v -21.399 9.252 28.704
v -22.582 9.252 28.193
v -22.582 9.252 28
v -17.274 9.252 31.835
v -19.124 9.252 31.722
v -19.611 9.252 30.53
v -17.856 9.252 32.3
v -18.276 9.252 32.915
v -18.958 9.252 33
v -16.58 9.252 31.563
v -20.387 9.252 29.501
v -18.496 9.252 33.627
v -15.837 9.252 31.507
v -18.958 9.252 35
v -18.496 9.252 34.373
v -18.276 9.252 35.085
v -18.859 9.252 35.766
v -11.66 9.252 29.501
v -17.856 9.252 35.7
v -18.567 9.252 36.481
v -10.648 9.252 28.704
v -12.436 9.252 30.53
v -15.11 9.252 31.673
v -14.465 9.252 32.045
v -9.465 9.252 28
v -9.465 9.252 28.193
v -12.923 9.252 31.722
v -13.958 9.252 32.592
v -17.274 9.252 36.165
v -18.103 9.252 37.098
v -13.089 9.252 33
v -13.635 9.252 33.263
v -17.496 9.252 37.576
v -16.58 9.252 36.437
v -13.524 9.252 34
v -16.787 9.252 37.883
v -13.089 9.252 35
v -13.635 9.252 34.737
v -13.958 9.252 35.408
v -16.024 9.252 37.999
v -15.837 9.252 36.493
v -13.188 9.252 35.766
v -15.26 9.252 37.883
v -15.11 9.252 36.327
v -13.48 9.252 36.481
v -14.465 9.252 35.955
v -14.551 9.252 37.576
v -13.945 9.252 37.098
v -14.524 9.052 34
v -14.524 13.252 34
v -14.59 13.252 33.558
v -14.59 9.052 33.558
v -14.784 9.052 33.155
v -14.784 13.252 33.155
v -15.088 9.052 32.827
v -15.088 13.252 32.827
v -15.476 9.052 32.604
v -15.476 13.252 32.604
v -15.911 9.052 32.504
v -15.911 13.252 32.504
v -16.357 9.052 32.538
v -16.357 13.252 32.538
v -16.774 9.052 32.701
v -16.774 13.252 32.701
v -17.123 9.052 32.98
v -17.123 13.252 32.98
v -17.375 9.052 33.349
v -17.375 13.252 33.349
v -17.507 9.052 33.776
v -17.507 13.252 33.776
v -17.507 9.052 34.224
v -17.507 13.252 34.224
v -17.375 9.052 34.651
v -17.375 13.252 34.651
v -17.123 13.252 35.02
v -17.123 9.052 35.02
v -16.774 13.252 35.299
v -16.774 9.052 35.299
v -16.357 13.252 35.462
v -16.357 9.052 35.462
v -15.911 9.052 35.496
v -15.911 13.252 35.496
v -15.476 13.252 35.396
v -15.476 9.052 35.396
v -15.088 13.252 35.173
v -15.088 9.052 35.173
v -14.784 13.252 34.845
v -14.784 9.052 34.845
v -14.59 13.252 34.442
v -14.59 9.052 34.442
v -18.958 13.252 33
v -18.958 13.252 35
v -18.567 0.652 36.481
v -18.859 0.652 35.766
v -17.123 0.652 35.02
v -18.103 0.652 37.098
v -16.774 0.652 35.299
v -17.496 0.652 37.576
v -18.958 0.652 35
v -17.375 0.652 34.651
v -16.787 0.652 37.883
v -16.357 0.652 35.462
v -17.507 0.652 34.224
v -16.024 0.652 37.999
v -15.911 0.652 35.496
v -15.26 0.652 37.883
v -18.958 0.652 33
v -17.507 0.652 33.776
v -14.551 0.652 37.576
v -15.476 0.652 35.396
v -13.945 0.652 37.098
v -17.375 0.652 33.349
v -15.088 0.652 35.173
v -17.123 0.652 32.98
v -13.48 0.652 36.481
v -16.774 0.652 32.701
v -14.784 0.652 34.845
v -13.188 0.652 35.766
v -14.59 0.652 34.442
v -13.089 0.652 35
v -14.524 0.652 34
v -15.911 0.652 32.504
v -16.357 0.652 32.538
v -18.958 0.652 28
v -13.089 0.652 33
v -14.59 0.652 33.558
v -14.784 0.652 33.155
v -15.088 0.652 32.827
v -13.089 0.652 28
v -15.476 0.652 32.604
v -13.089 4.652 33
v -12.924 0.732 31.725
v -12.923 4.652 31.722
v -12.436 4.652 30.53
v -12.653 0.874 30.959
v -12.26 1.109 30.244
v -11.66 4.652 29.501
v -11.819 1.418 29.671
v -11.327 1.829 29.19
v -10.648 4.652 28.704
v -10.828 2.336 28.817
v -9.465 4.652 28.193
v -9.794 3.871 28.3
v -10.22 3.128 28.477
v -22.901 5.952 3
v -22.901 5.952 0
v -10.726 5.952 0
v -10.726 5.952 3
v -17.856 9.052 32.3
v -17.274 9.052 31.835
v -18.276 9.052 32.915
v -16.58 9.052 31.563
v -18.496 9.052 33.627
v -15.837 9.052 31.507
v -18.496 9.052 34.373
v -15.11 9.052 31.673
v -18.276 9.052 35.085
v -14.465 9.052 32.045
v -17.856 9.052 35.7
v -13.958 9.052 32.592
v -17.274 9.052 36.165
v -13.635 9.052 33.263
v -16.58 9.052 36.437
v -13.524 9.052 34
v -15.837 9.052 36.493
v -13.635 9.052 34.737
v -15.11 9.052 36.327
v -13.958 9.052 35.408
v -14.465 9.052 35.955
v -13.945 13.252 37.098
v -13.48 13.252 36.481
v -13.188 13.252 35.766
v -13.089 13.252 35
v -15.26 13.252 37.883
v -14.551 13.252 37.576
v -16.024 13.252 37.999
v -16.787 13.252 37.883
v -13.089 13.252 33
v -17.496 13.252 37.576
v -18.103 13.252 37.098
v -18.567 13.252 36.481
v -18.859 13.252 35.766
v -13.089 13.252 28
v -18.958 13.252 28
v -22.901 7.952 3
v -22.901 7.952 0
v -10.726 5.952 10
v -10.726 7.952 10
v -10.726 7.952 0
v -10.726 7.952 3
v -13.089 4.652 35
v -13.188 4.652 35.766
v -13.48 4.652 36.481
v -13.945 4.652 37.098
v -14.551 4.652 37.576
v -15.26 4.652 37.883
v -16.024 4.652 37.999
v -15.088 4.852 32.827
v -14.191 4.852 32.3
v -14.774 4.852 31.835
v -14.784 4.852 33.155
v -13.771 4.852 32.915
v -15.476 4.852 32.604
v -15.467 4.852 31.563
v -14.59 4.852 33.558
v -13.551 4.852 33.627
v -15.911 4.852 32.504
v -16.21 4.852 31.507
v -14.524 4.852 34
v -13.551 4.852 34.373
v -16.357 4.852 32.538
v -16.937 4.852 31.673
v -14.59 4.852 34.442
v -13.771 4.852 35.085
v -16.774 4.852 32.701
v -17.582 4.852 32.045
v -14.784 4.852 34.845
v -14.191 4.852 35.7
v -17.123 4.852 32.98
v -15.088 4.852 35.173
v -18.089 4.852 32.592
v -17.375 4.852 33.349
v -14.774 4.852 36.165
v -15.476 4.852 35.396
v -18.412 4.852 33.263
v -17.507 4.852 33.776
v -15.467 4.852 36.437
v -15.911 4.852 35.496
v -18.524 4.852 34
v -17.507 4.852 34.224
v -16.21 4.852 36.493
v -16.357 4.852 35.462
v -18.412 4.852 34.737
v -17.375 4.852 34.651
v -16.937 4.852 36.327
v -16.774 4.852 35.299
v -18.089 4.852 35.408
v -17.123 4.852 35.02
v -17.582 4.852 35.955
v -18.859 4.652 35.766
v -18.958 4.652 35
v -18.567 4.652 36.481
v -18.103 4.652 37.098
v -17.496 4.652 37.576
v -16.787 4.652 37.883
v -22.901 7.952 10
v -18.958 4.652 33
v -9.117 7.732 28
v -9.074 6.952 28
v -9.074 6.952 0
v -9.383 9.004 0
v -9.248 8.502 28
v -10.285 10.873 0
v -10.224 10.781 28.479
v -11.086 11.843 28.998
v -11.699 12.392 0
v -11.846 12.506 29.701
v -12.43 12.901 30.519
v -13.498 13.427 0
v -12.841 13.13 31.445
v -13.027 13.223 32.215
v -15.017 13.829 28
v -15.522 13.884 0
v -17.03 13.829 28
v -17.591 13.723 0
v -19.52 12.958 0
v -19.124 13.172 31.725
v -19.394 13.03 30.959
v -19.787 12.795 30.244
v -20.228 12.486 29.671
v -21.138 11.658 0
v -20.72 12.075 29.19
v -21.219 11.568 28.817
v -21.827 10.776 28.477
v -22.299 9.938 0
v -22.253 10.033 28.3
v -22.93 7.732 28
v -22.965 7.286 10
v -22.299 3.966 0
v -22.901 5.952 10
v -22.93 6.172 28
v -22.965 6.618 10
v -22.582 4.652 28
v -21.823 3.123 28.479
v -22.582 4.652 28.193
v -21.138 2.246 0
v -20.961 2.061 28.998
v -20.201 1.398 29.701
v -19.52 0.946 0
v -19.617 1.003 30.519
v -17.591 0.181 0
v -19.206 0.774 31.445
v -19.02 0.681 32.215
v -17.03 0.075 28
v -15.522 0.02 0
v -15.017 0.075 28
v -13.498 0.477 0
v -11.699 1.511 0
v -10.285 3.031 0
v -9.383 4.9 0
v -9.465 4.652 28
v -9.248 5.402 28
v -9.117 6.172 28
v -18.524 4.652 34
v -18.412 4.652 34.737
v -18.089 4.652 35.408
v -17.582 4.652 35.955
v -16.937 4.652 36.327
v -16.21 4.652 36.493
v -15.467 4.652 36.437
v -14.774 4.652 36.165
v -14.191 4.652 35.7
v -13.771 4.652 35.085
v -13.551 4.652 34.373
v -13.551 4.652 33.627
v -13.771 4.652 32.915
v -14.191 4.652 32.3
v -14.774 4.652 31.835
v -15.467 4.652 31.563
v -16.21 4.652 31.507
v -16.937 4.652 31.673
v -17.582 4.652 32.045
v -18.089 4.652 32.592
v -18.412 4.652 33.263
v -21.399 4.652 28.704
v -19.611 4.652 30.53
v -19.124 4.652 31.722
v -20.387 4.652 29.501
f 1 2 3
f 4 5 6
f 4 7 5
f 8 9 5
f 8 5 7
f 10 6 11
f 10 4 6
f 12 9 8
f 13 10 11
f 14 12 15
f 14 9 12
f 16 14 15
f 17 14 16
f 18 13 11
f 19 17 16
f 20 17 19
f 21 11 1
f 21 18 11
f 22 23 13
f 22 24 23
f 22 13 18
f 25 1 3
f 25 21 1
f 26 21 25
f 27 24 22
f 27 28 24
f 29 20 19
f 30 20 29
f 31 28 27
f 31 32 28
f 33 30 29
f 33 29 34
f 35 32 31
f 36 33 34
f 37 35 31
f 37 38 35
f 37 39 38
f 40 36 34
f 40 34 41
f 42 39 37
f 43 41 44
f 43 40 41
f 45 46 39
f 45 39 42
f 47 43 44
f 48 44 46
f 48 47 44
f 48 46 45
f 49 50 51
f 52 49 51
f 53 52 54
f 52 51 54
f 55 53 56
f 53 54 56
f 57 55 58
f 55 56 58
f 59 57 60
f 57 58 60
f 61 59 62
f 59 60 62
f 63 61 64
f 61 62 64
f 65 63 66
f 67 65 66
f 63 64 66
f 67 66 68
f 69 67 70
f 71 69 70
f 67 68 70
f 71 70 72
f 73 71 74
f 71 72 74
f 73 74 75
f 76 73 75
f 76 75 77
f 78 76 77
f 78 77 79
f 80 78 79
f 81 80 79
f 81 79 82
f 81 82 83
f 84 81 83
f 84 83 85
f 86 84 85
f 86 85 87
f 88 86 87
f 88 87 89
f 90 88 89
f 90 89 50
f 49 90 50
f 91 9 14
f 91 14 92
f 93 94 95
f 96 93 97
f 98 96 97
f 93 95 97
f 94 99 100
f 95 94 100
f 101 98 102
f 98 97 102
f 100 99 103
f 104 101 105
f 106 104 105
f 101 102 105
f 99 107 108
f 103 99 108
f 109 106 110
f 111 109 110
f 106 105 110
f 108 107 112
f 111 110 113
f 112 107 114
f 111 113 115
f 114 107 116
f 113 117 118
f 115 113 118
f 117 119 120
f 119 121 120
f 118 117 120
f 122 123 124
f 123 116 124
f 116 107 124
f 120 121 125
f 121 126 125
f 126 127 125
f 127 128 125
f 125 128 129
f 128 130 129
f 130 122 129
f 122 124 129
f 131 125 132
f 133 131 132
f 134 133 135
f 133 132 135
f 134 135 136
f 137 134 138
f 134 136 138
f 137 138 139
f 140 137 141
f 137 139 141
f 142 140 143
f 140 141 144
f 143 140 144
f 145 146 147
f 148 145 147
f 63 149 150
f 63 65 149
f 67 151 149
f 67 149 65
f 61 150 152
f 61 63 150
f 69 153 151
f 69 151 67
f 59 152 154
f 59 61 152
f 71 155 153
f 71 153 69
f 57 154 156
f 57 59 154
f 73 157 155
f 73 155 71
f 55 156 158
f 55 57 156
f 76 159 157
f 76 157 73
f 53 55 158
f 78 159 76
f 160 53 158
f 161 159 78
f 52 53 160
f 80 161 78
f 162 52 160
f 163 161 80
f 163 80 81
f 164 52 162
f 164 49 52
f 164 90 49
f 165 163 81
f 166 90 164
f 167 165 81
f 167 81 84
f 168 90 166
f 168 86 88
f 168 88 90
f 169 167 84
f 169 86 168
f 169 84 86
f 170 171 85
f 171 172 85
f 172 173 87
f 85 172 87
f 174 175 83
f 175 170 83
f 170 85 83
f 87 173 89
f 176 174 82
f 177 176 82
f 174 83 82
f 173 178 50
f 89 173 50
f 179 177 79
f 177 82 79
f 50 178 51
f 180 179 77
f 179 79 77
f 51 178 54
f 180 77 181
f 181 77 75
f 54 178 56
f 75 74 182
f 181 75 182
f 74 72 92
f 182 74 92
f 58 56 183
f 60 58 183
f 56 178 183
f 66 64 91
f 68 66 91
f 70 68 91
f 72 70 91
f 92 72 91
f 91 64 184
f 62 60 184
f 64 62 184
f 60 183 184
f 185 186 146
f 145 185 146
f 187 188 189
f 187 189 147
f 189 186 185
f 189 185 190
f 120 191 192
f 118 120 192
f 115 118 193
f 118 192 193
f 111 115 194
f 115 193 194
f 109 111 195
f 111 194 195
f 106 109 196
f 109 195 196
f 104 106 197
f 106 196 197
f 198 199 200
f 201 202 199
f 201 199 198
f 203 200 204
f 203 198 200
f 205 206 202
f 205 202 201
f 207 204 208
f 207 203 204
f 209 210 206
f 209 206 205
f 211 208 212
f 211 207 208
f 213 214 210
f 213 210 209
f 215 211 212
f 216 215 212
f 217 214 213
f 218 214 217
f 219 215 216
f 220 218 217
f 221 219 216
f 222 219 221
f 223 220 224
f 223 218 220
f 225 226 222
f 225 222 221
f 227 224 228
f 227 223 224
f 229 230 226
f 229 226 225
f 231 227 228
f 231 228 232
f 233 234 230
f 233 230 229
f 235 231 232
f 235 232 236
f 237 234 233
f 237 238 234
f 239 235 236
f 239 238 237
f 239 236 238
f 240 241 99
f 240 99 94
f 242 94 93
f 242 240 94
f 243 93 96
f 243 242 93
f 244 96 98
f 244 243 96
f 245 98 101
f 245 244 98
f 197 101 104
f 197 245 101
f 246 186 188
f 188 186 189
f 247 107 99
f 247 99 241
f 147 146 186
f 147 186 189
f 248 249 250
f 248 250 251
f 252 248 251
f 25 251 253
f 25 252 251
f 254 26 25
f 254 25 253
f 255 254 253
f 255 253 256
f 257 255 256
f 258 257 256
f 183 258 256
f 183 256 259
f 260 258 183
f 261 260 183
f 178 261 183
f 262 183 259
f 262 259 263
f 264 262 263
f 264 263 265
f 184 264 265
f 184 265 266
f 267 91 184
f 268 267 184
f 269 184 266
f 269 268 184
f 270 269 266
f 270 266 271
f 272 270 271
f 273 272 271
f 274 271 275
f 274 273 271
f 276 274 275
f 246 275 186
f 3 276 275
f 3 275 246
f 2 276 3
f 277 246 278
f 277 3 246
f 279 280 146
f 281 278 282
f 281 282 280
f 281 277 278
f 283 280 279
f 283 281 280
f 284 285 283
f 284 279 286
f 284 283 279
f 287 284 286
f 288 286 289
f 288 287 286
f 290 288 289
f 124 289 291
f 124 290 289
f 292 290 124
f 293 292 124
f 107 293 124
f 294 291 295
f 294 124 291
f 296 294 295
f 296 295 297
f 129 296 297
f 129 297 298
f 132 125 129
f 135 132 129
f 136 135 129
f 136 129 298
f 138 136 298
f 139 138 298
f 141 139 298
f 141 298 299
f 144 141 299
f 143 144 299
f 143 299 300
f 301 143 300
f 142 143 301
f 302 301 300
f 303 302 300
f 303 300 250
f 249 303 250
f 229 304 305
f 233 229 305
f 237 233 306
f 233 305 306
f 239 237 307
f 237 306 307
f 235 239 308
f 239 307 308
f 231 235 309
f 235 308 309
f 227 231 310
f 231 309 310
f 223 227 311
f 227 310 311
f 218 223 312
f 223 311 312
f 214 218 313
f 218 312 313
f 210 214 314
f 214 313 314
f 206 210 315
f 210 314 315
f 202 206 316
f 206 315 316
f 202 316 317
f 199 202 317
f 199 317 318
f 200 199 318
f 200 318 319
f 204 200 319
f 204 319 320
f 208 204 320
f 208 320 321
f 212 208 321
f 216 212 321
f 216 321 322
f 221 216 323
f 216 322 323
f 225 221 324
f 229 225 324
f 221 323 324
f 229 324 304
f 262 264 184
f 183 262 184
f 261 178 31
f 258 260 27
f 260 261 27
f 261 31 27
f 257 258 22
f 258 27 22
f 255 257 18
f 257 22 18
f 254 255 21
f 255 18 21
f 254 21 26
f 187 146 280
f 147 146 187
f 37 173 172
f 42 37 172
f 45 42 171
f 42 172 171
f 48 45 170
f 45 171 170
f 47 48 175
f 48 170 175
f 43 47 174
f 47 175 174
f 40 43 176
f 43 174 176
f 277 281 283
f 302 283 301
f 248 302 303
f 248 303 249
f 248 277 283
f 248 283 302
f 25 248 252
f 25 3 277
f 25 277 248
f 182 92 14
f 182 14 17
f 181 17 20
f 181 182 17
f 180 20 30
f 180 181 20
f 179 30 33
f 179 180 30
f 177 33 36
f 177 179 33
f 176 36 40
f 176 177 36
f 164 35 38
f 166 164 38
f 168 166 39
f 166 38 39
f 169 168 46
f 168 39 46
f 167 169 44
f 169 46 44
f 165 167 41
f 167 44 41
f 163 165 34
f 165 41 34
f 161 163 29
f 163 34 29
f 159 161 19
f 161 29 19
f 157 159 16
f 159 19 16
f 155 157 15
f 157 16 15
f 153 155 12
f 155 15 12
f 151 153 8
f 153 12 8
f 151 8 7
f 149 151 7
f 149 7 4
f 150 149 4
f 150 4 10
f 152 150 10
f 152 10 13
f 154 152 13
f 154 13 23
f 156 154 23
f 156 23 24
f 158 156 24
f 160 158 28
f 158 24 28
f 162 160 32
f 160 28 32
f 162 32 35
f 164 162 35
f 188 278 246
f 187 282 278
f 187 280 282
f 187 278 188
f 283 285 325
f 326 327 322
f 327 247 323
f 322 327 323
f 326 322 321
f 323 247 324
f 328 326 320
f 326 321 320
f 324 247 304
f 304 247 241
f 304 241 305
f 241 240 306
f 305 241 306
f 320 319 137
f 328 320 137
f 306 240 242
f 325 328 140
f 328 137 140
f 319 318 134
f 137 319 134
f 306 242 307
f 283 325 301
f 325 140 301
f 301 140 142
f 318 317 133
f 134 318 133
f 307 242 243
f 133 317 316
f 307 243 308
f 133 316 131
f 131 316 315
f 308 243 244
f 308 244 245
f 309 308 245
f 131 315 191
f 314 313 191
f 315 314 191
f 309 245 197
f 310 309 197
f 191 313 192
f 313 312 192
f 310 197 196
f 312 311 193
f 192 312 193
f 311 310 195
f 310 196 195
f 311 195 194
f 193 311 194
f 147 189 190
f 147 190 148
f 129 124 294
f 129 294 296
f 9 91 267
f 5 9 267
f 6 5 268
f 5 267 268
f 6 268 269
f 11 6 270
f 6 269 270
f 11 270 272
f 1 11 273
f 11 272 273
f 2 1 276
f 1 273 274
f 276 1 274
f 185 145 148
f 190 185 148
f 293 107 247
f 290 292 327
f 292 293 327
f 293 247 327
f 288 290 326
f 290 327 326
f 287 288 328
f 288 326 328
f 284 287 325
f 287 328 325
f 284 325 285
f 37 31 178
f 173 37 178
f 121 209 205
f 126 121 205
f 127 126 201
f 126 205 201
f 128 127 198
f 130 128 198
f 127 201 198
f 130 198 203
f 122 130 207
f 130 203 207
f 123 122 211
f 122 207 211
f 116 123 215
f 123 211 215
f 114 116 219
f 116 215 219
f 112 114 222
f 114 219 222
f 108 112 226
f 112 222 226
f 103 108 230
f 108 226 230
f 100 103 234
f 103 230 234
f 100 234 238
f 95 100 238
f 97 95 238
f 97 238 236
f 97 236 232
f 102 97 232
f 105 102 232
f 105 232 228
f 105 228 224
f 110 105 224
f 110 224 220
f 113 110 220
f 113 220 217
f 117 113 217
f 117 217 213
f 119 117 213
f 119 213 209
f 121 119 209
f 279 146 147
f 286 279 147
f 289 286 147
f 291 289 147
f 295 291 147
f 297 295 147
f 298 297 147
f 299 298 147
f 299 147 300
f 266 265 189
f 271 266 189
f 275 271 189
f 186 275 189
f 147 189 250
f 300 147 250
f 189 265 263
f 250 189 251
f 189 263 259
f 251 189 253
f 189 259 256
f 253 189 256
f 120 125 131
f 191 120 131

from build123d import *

# Parameters (mm, degrees)
F0_R         = 6.95
F1_DEPTH     = 28
F2_W         = 2.9347061182
F2_H         = 4
F3_DEPTH     = 10
F4_T1_DEPTH  = 19
F4_T3_DEPTH  = 19
F5_T4_DEPTH  = 4
F5_S5_R      = 6.95
F5_T6_DEPTH  = 6
F5_T10_DEPTH = 4
F5_S11_R     = 6.95
F5_T12_DEPTH = 6
F5_T16_DEPTH = 4
F5_S17_R     = 6.95
F5_T18_DEPTH = 6
F5_T22_DEPTH = 4
F5_S23_R     = 6.95
F5_T24_DEPTH = 6
F7_W         = 12.5890113413
F7_H         = 2
F8_DEPTH     = 10
F9_W         = 12.1756089176
F9_H         = 2
F10_DEPTH    = 3
F11_R        = 2.5
F12_DEPTH    = 0.2
F13_R        = 2.5
F14_DEPTH    = 0.2
F15_DEPTH    = 13.2510001


# Not quite as in the source:
# - a fillet or chamfer that OpenCascade refuses, or shapes differently, is made with other operations: its cross-section is extruded or revolved along the edge and cut away or added


with BuildPart() as f1:
    # F0 (on Top) → F1 (new body)
    with BuildSketch(Plane.XY):
        with Locations((-16.023524542, 6.9519880981)):
            Circle(F0_R)
    extrude(amount=F1_DEPTH)

    # F2 (on face) → F3 (join)
    with BuildSketch(Plane.XY.offset(28)):
        with Locations((-17.490877601, 11.2519880981)):
            Rectangle(F2_W, F2_H)
        with Locations((-14.5561714829, 11.2519880981)):
            Rectangle(F2_W, F2_H)
        with Locations((-17.490877601, 2.6519880981)):
            Rectangle(F2_W, F2_H)
        with Locations((-14.5561714829, 2.6519880981)):
            Rectangle(F2_W, F2_H)
    extrude(amount=F3_DEPTH)

    # F4: fillet of radius 3 on 4 edges, made by hand

    # F4_s2 → F4_t1 (cut)
    with BuildSketch(Plane.XZ.offset(-12.1519880981)):
        with BuildLine():
            ThreePointArc((-13.0888184238, 35), (-13.9674980802, 37.1213203436), (-16.0888184238, 38))
            Line((-16.0888184238, 38), (-13.0888184238, 38))
            Line((-13.0888184238, 38), (-13.0888184238, 35))
        make_face()
        with BuildLine():
            ThreePointArc((-18.9582306601, 35), (-18.0795510037, 37.1213203436), (-15.9582306601, 38))
            Line((-15.9582306601, 38), (-18.9582306601, 38))
            Line((-18.9582306601, 38), (-18.9582306601, 35))
        make_face()
    extrude(amount=F4_T1_DEPTH, mode=Mode.SUBTRACT)

    # F4_s4 → F4_t3 (cut)
    with BuildSketch(Plane.XZ.offset(-20.7519880981)):
        with BuildLine():
            ThreePointArc((-13.0888184238, 35), (-13.9674980802, 37.1213203436), (-16.0888184238, 38))
            Line((-16.0888184238, 38), (-13.0888184238, 38))
            Line((-13.0888184238, 38), (-13.0888184238, 35))
        make_face()
        with BuildLine():
            ThreePointArc((-18.9582306601, 35), (-18.0795510037, 37.1213203436), (-15.9582306601, 38))
            Line((-15.9582306601, 38), (-18.9582306601, 38))
            Line((-18.9582306601, 38), (-18.9582306601, 35))
        make_face()
    extrude(amount=F4_T3_DEPTH, mode=Mode.SUBTRACT)

    # F5: fillet of radius 5 on 4 edges, made by hand


with BuildPart() as f5_tool2:
    # F5_s3 → F5_t4 (new body)
    with BuildSketch(Plane.XZ.offset(-0.6519880981)):
        with BuildLine():
            ThreePointArc((-13.0888184238, 33), (-11.6243523297, 29.4644660941), (-8.0888184238, 28))
            Line((-8.0888184238, 28), (-8.0888184238, 27.9))
            Line((-8.0888184238, 27.9), (-13.1888184238, 27.9))
            Line((-13.1888184238, 27.9), (-13.1888184238, 33))
            Line((-13.1888184238, 33), (-13.0888184238, 33))
        make_face()
    extrude(amount=-F5_T4_DEPTH)

    # F5_s5 → F5_t6 (intersect, symmetric)
    with BuildSketch(Plane.XY.offset(30.4)):
        with Locations((-16.023524542, 6.9519880981)):
            Circle(F5_S5_R)
    extrude(amount=F5_T6_DEPTH, both=True, mode=Mode.INTERSECT)


with BuildPart() as f1_1:
    add(f1.part)

    # F5_t1: union F5_tool2
    add(f5_tool2.part)


with BuildPart() as f5_tool8:
    # F5_s9 → F5_t10 (new body)
    with BuildSketch(Plane.XZ.offset(-9.2519880981)):
        with BuildLine():
            ThreePointArc((-13.0888184238, 33), (-11.6243523297, 29.4644660941), (-8.0888184238, 28))
            Line((-8.0888184238, 28), (-8.0888184238, 27.9))
            Line((-8.0888184238, 27.9), (-13.1888184238, 27.9))
            Line((-13.1888184238, 27.9), (-13.1888184238, 33))
            Line((-13.1888184238, 33), (-13.0888184238, 33))
        make_face()
    extrude(amount=-F5_T10_DEPTH)

    # F5_s11 → F5_t12 (intersect, symmetric)
    with BuildSketch(Plane.XY.offset(30.4)):
        with Locations((-16.023524542, 6.9519880981)):
            Circle(F5_S11_R)
    extrude(amount=F5_T12_DEPTH, both=True, mode=Mode.INTERSECT)


with BuildPart() as f1_2:
    add(f1_1.part)

    # F5_t7: union F5_tool8
    add(f5_tool8.part)


with BuildPart() as f5_tool14:
    # F5_s15 → F5_t16 (new body)
    with BuildSketch(Plane.XZ.offset(-13.2519880981)):
        with BuildLine():
            ThreePointArc((-18.9582306601, 33), (-20.4226967542, 29.4644660941), (-23.9582306601, 28))
            Line((-23.9582306601, 28), (-23.9582306601, 27.9))
            Line((-23.9582306601, 27.9), (-18.8582306601, 27.9))
            Line((-18.8582306601, 27.9), (-18.8582306601, 33))
            Line((-18.8582306601, 33), (-18.9582306601, 33))
        make_face()
    extrude(amount=F5_T16_DEPTH)

    # F5_s17 → F5_t18 (intersect, symmetric)
    with BuildSketch(Plane.XY.offset(30.4)):
        with Locations((-16.023524542, 6.9519880981)):
            Circle(F5_S17_R)
    extrude(amount=F5_T18_DEPTH, both=True, mode=Mode.INTERSECT)


with BuildPart() as f1_3:
    add(f1_2.part)

    # F5_t13: union F5_tool14
    add(f5_tool14.part)


with BuildPart() as f5_tool20:
    # F5_s21 → F5_t22 (new body)
    with BuildSketch(Plane.XZ.offset(-4.6519880981)):
        with BuildLine():
            ThreePointArc((-18.9582306601, 33), (-20.4226967542, 29.4644660941), (-23.9582306601, 28))
            Line((-23.9582306601, 28), (-23.9582306601, 27.9))
            Line((-23.9582306601, 27.9), (-18.8582306601, 27.9))
            Line((-18.8582306601, 27.9), (-18.8582306601, 33))
            Line((-18.8582306601, 33), (-18.9582306601, 33))
        make_face()
    extrude(amount=F5_T22_DEPTH)

    # F5_s23 → F5_t24 (intersect, symmetric)
    with BuildSketch(Plane.XY.offset(30.4)):
        with Locations((-16.023524542, 6.9519880981)):
            Circle(F5_S23_R)
    extrude(amount=F5_T24_DEPTH, both=True, mode=Mode.INTERSECT)


with BuildPart() as f1_4:
    add(f1_3.part)

    # F5_t19: union F5_tool20
    add(f5_tool20.part)

    # F7 (on face) → F8 (cut)
    with BuildSketch(Plane(origin=(0, 0, 0), x_dir=(1, 0, 0), z_dir=(0, 0, -1))):
        with Locations((-17.0201025903, -6.9519880981)):
            Rectangle(F7_W, F7_H)
    extrude(amount=-F8_DEPTH, mode=Mode.SUBTRACT)

    # F11 (on face) → F12 (join)
    with BuildSketch(Plane(origin=(0, 4.6519880981, 0), x_dir=(-1, 0, 0), z_dir=(0, 1, 0))):
        with Locations((16.023524542, 34)):
            Circle(F11_R)
    extrude(amount=F12_DEPTH)

    # F13 (on face) → F14 (join)
    with BuildSketch(Plane.XZ.offset(-9.2519880981)):
        with Locations((-16.023524542, 34)):
            Circle(F13_R)
    extrude(amount=F14_DEPTH)

    # F6 (on face) → F15 (cut, through all)
    with BuildSketch(Plane(origin=(0, 13.2519880981, 0), x_dir=(-1, 0, 0), z_dir=(0, 1, 0))):
        with BuildLine():
            ThreePointArc((17.523524542, 34), (16.023524542, 35.5), (14.523524542, 34))
            Line((14.523524542, 34), (17.523524542, 34))
        make_face()
        with BuildLine():
            Line((17.523524542, 34), (14.523524542, 34))
            ThreePointArc((14.523524542, 34), (16.023524542, 32.5), (17.523524542, 34))
        make_face()
    extrude(amount=-F15_DEPTH, mode=Mode.SUBTRACT)


with BuildPart() as f10:
    # F9 (on face) → F10 (new body)
    with BuildSketch(Plane(origin=(0, 0, 0), x_dir=(1, 0, 0), z_dir=(0, 0, -1))):
        with Locations((-16.8134013785, -6.9519880981)):
            Rectangle(F9_W, F9_H)
    extrude(amount=-F10_DEPTH)


solid = Compound([f1_4.part, f10.part])
